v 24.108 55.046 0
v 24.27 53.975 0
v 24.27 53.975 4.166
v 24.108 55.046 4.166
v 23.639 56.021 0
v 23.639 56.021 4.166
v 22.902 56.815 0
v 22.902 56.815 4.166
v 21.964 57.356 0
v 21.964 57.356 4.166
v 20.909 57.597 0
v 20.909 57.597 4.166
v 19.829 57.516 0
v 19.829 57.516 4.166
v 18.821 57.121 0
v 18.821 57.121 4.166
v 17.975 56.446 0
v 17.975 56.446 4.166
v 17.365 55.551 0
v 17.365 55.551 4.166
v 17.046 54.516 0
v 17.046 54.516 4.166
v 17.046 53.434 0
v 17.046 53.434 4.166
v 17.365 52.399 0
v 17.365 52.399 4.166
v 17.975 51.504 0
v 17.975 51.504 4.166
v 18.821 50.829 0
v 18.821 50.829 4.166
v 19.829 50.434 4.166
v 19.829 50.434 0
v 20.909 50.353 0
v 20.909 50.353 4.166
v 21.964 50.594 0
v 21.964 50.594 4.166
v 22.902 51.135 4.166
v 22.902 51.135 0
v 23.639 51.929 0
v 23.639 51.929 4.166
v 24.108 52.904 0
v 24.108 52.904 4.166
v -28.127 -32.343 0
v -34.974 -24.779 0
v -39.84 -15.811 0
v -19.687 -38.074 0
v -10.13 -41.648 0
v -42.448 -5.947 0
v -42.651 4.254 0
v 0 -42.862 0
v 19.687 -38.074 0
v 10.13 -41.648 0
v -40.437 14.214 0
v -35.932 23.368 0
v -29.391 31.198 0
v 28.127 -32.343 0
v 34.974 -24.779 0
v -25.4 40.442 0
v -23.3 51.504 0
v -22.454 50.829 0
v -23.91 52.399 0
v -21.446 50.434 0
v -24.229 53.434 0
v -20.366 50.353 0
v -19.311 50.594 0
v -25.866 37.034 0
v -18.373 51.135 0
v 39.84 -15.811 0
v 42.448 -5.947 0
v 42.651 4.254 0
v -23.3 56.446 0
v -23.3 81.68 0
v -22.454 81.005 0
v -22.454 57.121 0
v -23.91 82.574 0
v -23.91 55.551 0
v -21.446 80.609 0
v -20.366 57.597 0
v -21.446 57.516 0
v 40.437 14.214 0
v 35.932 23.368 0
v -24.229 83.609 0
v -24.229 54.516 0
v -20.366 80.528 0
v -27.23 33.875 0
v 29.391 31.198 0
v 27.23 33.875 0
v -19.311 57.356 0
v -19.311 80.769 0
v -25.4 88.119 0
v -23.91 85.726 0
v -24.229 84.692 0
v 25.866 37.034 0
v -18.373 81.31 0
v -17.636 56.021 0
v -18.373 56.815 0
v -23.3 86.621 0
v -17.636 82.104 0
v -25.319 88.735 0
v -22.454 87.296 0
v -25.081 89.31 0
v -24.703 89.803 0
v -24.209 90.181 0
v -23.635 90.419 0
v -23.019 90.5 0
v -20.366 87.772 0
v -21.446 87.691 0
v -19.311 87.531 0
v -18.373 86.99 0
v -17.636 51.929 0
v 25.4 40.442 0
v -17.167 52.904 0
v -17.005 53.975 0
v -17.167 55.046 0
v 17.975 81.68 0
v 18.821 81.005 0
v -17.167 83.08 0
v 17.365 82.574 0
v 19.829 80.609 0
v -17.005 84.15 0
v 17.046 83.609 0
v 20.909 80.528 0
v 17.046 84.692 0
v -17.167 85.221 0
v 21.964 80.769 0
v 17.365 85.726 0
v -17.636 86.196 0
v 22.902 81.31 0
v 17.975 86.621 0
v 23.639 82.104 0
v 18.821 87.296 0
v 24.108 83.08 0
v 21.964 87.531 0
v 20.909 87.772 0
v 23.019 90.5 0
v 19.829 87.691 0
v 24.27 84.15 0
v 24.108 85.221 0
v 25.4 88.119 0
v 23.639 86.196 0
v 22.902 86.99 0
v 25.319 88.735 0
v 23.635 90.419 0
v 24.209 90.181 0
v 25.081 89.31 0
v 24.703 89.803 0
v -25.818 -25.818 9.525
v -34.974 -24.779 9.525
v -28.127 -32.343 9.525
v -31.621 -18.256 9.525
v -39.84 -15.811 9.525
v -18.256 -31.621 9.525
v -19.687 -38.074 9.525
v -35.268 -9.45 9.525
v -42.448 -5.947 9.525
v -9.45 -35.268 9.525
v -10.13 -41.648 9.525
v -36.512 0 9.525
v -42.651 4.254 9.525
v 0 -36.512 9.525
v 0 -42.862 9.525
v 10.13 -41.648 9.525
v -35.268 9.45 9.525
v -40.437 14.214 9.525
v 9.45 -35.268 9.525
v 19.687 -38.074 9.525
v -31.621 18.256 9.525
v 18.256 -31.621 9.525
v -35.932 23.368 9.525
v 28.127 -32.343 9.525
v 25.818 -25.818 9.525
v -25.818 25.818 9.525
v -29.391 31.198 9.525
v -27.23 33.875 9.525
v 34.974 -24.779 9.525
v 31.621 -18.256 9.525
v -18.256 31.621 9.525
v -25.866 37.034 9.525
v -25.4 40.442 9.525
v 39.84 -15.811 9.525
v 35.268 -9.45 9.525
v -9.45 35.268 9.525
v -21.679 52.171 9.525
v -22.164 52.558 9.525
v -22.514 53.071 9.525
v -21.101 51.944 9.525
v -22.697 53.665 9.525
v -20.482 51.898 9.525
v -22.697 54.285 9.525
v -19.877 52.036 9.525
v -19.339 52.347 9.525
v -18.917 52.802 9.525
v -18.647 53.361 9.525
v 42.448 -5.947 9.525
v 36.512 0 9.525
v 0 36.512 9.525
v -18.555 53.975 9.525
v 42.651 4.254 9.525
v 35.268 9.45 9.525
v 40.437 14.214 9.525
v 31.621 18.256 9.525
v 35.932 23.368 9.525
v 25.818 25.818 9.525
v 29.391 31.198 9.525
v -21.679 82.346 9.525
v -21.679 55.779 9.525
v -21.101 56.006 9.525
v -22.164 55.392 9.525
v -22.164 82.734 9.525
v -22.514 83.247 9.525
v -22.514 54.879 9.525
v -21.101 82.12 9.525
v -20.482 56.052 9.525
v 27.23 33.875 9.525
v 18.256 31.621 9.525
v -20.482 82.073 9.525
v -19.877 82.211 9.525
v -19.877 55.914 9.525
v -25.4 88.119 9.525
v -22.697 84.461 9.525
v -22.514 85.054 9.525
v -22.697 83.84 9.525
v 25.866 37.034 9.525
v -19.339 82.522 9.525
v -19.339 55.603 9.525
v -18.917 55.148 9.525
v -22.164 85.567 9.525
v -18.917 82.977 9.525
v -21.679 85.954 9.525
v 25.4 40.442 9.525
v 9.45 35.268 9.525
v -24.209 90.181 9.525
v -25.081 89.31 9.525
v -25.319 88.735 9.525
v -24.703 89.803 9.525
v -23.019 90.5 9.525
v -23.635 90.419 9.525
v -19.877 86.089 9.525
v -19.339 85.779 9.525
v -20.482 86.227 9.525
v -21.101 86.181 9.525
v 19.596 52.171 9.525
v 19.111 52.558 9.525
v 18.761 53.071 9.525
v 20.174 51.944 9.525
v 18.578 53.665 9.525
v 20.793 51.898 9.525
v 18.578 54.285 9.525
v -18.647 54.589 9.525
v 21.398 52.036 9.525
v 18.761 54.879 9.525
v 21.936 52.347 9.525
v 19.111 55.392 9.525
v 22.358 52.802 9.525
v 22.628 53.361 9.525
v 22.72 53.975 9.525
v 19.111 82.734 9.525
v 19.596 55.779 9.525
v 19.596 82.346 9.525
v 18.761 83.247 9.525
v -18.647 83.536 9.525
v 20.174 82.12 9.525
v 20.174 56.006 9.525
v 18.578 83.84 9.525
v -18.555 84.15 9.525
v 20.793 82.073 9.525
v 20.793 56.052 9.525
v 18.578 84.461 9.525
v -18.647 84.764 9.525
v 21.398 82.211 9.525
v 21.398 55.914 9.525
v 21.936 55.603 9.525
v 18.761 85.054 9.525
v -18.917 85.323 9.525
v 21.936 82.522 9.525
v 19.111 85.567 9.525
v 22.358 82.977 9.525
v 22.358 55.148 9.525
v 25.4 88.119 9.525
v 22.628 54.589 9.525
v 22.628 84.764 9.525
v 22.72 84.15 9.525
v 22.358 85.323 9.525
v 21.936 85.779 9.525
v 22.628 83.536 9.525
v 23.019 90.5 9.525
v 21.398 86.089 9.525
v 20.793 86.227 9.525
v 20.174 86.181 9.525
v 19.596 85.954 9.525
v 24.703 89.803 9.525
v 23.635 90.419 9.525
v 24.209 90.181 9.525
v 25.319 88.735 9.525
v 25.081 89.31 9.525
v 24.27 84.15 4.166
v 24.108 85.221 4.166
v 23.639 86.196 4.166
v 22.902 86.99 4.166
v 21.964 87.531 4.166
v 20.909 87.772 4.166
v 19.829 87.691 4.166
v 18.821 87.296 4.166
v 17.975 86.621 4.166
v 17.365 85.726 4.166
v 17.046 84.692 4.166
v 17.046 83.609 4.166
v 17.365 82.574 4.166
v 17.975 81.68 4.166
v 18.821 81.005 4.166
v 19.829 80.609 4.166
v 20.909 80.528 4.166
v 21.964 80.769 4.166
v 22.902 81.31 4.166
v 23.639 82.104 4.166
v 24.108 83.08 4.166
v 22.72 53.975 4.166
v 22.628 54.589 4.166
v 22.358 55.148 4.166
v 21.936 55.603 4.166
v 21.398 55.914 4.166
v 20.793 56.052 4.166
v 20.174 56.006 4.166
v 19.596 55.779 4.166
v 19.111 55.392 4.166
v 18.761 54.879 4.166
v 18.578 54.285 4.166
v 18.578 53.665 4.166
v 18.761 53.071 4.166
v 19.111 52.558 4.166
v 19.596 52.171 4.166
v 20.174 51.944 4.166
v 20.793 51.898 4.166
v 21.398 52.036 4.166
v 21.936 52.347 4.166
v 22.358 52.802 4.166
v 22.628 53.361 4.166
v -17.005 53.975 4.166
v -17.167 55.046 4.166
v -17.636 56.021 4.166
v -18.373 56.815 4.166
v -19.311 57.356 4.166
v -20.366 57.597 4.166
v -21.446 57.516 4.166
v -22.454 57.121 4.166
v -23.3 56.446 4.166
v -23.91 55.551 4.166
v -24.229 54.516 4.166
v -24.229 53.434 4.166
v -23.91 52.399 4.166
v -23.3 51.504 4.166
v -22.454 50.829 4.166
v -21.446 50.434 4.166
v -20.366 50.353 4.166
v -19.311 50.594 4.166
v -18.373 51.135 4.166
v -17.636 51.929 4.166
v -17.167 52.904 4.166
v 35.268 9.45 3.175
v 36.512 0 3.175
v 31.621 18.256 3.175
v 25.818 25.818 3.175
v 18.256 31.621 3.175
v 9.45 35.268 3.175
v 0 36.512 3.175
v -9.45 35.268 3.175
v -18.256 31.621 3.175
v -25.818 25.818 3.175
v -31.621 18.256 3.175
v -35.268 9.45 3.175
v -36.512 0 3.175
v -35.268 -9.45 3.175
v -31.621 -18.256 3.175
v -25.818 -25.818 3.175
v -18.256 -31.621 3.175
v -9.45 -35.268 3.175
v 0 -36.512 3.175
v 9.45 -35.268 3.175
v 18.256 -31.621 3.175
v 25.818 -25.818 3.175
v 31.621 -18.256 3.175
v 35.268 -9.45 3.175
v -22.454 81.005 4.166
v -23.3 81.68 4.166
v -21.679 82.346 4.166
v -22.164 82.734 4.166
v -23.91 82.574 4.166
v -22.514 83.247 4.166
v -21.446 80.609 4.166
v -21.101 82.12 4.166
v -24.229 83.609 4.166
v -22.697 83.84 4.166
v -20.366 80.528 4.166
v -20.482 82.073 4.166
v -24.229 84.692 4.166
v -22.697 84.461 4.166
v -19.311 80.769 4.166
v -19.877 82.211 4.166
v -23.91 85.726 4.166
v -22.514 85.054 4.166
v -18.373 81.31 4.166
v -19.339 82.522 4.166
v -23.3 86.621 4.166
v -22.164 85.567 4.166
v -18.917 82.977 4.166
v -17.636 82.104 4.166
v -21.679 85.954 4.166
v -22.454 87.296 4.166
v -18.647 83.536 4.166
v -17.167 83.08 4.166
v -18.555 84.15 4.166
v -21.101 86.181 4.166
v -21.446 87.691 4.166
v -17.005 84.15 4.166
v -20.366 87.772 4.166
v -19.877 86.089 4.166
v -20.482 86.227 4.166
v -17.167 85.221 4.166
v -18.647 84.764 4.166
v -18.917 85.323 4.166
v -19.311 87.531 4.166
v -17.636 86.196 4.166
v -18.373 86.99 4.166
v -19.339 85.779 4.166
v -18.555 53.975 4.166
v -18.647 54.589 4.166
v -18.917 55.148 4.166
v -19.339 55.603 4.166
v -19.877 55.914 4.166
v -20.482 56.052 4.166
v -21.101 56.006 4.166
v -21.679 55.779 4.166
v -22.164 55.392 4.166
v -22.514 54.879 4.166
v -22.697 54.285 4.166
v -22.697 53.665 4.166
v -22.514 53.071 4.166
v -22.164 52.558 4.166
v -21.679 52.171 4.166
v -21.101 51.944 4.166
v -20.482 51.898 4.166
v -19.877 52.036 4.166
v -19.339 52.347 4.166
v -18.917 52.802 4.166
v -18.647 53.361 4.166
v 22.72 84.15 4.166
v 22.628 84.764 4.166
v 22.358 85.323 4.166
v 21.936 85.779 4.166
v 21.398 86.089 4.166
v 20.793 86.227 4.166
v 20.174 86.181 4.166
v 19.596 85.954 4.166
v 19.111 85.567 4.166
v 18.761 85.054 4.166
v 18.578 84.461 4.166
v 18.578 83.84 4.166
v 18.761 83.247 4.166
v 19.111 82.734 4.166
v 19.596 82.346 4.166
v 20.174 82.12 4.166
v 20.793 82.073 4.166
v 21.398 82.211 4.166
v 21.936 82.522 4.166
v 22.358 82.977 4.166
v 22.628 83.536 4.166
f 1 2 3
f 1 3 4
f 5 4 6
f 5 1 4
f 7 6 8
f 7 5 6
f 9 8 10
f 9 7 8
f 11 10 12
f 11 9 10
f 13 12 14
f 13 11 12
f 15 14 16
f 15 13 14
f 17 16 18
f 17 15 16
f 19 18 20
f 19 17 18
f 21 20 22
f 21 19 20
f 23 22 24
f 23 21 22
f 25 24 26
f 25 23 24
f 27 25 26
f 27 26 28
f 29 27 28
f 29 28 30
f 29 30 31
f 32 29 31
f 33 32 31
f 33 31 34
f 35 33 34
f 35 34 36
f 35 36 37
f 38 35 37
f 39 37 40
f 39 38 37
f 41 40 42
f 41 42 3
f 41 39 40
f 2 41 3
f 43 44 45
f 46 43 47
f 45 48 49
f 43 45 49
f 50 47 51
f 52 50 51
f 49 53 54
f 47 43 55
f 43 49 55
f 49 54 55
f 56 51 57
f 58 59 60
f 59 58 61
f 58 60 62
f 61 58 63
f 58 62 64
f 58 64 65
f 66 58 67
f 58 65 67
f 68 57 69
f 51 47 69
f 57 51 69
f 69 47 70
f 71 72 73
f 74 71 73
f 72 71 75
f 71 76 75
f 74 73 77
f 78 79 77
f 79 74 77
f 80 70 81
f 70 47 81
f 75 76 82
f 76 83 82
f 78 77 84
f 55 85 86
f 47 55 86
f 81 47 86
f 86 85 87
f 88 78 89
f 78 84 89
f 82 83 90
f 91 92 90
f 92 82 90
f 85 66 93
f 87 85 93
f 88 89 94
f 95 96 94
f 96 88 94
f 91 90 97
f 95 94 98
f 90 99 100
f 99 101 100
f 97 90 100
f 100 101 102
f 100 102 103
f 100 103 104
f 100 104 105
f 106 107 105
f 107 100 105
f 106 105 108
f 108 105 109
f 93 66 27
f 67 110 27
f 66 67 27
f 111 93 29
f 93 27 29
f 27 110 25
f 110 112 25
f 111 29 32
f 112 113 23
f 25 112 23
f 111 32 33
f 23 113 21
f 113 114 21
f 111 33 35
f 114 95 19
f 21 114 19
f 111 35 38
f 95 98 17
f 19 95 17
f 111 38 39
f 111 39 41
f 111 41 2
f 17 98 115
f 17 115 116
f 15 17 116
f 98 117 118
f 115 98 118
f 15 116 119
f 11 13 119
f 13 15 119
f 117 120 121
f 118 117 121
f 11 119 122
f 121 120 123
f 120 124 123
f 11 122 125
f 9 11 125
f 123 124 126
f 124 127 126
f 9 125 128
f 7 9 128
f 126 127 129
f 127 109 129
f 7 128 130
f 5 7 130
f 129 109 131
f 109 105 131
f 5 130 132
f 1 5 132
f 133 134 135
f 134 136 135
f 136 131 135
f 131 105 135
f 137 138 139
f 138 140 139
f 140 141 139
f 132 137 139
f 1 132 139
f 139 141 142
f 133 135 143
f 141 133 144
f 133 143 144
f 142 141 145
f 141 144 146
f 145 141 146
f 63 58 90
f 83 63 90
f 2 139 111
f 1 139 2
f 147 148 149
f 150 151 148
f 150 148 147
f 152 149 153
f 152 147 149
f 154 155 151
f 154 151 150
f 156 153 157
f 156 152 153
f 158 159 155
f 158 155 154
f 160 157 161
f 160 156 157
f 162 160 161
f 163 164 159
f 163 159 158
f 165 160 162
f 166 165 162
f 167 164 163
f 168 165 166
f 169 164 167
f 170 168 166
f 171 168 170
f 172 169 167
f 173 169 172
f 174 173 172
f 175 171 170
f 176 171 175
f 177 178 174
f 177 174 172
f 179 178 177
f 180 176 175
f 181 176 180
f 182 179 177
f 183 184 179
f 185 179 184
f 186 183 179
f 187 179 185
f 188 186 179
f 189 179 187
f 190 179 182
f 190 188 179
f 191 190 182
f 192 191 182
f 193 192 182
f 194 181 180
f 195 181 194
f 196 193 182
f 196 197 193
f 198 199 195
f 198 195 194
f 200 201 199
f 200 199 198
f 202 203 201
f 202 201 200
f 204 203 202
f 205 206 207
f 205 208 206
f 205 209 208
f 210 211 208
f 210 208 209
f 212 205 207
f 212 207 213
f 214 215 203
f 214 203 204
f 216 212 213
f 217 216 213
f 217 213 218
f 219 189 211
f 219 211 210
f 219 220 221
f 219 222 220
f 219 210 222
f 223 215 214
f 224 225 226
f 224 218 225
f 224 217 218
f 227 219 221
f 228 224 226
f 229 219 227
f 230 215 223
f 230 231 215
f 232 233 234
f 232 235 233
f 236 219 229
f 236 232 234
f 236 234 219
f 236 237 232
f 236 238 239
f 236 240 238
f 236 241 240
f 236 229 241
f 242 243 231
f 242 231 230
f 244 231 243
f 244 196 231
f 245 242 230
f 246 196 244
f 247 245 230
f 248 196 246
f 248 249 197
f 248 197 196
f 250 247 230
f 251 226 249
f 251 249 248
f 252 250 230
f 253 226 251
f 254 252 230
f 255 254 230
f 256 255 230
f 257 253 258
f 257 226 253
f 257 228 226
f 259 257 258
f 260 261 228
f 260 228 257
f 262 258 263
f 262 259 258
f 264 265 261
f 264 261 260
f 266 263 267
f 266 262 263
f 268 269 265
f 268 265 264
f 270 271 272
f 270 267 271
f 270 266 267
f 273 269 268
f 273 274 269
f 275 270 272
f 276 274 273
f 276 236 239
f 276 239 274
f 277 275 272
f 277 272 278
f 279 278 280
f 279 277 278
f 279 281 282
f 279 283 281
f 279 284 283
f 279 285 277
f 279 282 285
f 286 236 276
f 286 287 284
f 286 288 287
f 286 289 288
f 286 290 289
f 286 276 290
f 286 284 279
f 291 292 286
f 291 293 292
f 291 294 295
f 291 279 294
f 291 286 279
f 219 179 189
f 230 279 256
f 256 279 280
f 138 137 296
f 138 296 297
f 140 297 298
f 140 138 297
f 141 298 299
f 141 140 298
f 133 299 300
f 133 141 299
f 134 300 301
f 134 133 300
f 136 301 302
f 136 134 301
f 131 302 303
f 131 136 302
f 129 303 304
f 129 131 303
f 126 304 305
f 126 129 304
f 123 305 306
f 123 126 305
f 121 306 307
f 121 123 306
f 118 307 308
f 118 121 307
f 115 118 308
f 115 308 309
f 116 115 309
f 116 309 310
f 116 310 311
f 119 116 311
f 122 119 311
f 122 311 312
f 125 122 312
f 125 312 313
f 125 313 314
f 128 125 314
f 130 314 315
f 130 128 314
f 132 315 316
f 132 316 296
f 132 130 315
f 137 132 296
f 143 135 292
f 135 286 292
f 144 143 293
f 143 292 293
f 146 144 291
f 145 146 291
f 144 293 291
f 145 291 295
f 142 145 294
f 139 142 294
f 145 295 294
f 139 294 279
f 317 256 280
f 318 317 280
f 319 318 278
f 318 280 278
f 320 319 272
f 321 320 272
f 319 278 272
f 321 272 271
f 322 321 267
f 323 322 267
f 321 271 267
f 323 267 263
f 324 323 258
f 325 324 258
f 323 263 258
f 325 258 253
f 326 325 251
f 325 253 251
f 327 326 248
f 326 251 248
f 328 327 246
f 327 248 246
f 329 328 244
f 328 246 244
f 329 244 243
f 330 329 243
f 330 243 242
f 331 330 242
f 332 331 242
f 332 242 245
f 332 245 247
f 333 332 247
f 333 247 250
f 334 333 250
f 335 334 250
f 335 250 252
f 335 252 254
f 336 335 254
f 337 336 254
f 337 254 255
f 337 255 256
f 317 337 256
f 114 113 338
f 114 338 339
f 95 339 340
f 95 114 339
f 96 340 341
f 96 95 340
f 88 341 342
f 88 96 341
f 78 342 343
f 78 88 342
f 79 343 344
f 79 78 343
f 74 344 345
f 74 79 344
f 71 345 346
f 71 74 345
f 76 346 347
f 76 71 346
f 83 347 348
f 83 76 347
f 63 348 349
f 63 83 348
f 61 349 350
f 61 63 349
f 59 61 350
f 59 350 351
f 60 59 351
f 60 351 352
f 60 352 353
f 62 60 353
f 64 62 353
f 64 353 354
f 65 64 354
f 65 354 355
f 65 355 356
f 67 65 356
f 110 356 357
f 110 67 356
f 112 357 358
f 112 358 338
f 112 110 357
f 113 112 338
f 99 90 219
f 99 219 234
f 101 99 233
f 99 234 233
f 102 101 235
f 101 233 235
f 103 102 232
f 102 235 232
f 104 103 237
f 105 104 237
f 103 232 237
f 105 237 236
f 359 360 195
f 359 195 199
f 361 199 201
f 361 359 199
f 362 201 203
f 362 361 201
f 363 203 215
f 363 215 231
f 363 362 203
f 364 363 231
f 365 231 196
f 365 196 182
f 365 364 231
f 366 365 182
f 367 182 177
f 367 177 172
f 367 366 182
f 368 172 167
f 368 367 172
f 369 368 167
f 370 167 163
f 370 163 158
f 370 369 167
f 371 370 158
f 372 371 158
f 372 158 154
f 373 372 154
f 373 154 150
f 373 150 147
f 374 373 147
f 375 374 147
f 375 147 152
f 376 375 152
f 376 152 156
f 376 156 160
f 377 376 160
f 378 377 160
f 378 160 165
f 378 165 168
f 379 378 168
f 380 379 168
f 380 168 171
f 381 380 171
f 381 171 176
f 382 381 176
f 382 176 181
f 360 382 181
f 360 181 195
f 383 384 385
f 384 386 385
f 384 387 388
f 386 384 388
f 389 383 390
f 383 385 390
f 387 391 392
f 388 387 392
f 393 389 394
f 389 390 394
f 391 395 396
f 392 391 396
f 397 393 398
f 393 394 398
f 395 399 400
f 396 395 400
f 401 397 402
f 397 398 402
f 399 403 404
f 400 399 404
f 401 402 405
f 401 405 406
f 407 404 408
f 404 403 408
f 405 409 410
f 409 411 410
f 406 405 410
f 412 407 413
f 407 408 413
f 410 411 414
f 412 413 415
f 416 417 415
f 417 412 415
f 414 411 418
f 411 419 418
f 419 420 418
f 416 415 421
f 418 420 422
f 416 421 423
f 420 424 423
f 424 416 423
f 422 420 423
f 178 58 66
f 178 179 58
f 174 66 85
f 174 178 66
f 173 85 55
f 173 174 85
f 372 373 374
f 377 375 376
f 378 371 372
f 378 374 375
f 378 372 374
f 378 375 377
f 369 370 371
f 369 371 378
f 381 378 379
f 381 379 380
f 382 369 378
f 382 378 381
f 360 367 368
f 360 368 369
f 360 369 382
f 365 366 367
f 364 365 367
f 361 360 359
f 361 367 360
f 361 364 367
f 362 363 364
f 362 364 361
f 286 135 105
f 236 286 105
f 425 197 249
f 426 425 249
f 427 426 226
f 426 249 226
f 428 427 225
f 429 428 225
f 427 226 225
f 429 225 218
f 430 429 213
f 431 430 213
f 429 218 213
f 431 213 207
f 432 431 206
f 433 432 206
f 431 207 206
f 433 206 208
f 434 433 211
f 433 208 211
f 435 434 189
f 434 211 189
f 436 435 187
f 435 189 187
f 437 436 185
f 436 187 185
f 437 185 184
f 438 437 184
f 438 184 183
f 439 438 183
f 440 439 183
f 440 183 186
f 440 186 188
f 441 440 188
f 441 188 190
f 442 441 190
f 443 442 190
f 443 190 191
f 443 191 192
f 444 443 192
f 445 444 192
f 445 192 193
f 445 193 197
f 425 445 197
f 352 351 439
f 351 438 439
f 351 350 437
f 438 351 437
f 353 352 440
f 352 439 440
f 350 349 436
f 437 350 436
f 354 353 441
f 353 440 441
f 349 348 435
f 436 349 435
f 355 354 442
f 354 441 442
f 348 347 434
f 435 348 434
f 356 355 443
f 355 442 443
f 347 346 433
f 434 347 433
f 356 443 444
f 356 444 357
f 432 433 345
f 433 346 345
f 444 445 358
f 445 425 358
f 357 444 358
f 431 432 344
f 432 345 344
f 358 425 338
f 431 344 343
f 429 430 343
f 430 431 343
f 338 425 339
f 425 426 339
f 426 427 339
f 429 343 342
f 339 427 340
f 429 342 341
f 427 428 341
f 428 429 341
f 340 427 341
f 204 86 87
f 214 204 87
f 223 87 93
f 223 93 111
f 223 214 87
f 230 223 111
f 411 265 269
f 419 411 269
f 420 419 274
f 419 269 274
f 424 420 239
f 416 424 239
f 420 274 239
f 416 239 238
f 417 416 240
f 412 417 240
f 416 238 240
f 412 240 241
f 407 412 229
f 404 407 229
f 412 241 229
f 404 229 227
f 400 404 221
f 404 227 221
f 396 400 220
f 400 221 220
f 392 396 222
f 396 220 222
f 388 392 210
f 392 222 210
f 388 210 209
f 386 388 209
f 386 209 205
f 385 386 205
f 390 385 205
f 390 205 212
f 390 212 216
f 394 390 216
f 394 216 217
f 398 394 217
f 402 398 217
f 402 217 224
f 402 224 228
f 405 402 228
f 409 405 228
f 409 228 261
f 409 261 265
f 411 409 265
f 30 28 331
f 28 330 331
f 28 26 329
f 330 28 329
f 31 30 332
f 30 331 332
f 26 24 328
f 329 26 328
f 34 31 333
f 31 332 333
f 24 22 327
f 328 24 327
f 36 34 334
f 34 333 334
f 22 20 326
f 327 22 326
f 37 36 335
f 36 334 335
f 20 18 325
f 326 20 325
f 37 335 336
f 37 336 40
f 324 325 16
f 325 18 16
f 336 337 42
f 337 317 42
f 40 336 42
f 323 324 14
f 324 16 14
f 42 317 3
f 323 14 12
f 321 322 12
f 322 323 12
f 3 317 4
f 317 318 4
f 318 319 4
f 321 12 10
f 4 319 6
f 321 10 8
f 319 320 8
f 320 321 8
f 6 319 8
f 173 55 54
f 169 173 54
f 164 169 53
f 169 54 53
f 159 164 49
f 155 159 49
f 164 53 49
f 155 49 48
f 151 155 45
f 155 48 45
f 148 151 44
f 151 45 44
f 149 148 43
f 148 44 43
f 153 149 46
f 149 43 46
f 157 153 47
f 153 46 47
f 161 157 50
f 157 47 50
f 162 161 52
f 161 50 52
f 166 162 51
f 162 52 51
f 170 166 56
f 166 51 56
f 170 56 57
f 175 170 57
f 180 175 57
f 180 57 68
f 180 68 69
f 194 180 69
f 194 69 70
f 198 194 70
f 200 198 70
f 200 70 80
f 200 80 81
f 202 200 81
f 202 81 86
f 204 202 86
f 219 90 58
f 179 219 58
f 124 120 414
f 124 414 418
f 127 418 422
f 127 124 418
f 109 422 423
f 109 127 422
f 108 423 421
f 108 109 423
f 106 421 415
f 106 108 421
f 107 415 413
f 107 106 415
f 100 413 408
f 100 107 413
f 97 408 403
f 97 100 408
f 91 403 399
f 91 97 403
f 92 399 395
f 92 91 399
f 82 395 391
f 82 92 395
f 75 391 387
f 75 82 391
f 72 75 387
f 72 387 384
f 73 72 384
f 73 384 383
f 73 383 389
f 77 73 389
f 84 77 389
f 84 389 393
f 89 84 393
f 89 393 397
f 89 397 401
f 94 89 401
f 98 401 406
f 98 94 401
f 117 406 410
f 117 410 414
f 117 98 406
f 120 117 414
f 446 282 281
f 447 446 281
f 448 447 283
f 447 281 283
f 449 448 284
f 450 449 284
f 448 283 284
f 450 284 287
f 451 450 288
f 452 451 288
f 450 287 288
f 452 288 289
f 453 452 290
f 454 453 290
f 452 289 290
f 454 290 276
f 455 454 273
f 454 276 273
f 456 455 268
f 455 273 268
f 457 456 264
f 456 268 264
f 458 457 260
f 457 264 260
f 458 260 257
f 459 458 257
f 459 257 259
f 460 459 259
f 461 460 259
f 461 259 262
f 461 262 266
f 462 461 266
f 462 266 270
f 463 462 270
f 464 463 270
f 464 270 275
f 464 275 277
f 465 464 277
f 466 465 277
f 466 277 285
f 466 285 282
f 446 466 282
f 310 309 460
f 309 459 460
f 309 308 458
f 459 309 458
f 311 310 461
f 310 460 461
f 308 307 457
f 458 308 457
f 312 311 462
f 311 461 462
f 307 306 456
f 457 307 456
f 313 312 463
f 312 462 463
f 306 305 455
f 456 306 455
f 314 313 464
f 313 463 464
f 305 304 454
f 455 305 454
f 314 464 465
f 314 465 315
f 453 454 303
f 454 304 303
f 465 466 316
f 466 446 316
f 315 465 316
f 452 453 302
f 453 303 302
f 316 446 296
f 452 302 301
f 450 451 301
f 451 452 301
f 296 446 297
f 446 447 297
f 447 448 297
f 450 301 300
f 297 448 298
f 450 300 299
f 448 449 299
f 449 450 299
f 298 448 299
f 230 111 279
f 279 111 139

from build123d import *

# Parameters (mm, degrees)
F0_R     = 36.5125
F1_DEPTH = 9.525
F2_R     = 36.5125
F3_DEPTH = 3.175
F4_R     = 2.0828
F5_DEPTH = 9.526
F6_R     = 3.6322
F6_R_2   = 2.0828
F7_DEPTH = 4.1656
F8_R     = 2.38125
F9_R     = 12.7


with BuildPart() as f1:
    # F0 (on Top) → F1 (new body)
    with BuildSketch(Plane.XY):
        with BuildLine():
            Line((-25.4, 90.5002), (-25.4, 34.525844))
            ThreePointArc((-25.4, 34.525844), (0, -42.8625), (25.4, 34.525844))
            Line((25.4, 34.525844), (25.4, 90.5002))
            Line((25.4, 90.5002), (-25.4, 90.5002))
        make_face()
        Circle(F0_R, mode=Mode.SUBTRACT)
    extrude(amount=F1_DEPTH)

    # F2 (on Top) → F3 (join)
    with BuildSketch(Plane.XY):
        Circle(F2_R)
    extrude(amount=F3_DEPTH)

    # F4 (on face) → F5 (cut, through all)
    with BuildSketch(Plane.XY.offset(9.525)):
        with Locations((-20.6375, 84.1502)):
            Circle(F4_R)
        with Locations((20.6375, 84.1502)):
            Circle(F4_R)
        with Locations((-20.6375, 53.975)):
            Circle(F4_R)
        with Locations((20.6375, 53.975)):
            Circle(F4_R)
    extrude(amount=-F5_DEPTH, mode=Mode.SUBTRACT)

    # F6 (on face) → F7 (cut)
    with BuildSketch(Plane.XY):
        with Locations((20.6375, 84.1502)):
            Circle(F6_R)
        with Locations((20.6375, 84.1502)):
            Circle(F6_R_2, mode=Mode.SUBTRACT)
        with Locations((-20.6375, 84.1502)):
            Circle(F6_R)
        with Locations((-20.6375, 84.1502)):
            Circle(F6_R_2, mode=Mode.SUBTRACT)
        with Locations((-20.6375, 53.975)):
            Circle(F6_R)
        with Locations((-20.6375, 53.975)):
            Circle(F6_R_2, mode=Mode.SUBTRACT)
        with Locations((20.6375, 53.975)):
            Circle(F6_R)
        with Locations((20.6375, 53.975)):
            Circle(F6_R_2, mode=Mode.SUBTRACT)
    extrude(amount=F7_DEPTH, mode=Mode.SUBTRACT)

    # F8
    f8_edges = [f1.edges().sort_by_distance(p)[0] for p in [
        (25.4, 90.5002, 4.7625),
        (-25.4, 90.5002, 4.7625),
    ]]
    fillet(f8_edges, radius=F8_R)

    # F9
    f9_edges = [f1.edges().sort_by_distance(p)[0] for p in [
        (25.4, 34.525844, 4.7625),
        (-25.4, 34.525844, 4.7625),
    ]]
    fillet(f9_edges, radius=F9_R)


solid = f1.part
